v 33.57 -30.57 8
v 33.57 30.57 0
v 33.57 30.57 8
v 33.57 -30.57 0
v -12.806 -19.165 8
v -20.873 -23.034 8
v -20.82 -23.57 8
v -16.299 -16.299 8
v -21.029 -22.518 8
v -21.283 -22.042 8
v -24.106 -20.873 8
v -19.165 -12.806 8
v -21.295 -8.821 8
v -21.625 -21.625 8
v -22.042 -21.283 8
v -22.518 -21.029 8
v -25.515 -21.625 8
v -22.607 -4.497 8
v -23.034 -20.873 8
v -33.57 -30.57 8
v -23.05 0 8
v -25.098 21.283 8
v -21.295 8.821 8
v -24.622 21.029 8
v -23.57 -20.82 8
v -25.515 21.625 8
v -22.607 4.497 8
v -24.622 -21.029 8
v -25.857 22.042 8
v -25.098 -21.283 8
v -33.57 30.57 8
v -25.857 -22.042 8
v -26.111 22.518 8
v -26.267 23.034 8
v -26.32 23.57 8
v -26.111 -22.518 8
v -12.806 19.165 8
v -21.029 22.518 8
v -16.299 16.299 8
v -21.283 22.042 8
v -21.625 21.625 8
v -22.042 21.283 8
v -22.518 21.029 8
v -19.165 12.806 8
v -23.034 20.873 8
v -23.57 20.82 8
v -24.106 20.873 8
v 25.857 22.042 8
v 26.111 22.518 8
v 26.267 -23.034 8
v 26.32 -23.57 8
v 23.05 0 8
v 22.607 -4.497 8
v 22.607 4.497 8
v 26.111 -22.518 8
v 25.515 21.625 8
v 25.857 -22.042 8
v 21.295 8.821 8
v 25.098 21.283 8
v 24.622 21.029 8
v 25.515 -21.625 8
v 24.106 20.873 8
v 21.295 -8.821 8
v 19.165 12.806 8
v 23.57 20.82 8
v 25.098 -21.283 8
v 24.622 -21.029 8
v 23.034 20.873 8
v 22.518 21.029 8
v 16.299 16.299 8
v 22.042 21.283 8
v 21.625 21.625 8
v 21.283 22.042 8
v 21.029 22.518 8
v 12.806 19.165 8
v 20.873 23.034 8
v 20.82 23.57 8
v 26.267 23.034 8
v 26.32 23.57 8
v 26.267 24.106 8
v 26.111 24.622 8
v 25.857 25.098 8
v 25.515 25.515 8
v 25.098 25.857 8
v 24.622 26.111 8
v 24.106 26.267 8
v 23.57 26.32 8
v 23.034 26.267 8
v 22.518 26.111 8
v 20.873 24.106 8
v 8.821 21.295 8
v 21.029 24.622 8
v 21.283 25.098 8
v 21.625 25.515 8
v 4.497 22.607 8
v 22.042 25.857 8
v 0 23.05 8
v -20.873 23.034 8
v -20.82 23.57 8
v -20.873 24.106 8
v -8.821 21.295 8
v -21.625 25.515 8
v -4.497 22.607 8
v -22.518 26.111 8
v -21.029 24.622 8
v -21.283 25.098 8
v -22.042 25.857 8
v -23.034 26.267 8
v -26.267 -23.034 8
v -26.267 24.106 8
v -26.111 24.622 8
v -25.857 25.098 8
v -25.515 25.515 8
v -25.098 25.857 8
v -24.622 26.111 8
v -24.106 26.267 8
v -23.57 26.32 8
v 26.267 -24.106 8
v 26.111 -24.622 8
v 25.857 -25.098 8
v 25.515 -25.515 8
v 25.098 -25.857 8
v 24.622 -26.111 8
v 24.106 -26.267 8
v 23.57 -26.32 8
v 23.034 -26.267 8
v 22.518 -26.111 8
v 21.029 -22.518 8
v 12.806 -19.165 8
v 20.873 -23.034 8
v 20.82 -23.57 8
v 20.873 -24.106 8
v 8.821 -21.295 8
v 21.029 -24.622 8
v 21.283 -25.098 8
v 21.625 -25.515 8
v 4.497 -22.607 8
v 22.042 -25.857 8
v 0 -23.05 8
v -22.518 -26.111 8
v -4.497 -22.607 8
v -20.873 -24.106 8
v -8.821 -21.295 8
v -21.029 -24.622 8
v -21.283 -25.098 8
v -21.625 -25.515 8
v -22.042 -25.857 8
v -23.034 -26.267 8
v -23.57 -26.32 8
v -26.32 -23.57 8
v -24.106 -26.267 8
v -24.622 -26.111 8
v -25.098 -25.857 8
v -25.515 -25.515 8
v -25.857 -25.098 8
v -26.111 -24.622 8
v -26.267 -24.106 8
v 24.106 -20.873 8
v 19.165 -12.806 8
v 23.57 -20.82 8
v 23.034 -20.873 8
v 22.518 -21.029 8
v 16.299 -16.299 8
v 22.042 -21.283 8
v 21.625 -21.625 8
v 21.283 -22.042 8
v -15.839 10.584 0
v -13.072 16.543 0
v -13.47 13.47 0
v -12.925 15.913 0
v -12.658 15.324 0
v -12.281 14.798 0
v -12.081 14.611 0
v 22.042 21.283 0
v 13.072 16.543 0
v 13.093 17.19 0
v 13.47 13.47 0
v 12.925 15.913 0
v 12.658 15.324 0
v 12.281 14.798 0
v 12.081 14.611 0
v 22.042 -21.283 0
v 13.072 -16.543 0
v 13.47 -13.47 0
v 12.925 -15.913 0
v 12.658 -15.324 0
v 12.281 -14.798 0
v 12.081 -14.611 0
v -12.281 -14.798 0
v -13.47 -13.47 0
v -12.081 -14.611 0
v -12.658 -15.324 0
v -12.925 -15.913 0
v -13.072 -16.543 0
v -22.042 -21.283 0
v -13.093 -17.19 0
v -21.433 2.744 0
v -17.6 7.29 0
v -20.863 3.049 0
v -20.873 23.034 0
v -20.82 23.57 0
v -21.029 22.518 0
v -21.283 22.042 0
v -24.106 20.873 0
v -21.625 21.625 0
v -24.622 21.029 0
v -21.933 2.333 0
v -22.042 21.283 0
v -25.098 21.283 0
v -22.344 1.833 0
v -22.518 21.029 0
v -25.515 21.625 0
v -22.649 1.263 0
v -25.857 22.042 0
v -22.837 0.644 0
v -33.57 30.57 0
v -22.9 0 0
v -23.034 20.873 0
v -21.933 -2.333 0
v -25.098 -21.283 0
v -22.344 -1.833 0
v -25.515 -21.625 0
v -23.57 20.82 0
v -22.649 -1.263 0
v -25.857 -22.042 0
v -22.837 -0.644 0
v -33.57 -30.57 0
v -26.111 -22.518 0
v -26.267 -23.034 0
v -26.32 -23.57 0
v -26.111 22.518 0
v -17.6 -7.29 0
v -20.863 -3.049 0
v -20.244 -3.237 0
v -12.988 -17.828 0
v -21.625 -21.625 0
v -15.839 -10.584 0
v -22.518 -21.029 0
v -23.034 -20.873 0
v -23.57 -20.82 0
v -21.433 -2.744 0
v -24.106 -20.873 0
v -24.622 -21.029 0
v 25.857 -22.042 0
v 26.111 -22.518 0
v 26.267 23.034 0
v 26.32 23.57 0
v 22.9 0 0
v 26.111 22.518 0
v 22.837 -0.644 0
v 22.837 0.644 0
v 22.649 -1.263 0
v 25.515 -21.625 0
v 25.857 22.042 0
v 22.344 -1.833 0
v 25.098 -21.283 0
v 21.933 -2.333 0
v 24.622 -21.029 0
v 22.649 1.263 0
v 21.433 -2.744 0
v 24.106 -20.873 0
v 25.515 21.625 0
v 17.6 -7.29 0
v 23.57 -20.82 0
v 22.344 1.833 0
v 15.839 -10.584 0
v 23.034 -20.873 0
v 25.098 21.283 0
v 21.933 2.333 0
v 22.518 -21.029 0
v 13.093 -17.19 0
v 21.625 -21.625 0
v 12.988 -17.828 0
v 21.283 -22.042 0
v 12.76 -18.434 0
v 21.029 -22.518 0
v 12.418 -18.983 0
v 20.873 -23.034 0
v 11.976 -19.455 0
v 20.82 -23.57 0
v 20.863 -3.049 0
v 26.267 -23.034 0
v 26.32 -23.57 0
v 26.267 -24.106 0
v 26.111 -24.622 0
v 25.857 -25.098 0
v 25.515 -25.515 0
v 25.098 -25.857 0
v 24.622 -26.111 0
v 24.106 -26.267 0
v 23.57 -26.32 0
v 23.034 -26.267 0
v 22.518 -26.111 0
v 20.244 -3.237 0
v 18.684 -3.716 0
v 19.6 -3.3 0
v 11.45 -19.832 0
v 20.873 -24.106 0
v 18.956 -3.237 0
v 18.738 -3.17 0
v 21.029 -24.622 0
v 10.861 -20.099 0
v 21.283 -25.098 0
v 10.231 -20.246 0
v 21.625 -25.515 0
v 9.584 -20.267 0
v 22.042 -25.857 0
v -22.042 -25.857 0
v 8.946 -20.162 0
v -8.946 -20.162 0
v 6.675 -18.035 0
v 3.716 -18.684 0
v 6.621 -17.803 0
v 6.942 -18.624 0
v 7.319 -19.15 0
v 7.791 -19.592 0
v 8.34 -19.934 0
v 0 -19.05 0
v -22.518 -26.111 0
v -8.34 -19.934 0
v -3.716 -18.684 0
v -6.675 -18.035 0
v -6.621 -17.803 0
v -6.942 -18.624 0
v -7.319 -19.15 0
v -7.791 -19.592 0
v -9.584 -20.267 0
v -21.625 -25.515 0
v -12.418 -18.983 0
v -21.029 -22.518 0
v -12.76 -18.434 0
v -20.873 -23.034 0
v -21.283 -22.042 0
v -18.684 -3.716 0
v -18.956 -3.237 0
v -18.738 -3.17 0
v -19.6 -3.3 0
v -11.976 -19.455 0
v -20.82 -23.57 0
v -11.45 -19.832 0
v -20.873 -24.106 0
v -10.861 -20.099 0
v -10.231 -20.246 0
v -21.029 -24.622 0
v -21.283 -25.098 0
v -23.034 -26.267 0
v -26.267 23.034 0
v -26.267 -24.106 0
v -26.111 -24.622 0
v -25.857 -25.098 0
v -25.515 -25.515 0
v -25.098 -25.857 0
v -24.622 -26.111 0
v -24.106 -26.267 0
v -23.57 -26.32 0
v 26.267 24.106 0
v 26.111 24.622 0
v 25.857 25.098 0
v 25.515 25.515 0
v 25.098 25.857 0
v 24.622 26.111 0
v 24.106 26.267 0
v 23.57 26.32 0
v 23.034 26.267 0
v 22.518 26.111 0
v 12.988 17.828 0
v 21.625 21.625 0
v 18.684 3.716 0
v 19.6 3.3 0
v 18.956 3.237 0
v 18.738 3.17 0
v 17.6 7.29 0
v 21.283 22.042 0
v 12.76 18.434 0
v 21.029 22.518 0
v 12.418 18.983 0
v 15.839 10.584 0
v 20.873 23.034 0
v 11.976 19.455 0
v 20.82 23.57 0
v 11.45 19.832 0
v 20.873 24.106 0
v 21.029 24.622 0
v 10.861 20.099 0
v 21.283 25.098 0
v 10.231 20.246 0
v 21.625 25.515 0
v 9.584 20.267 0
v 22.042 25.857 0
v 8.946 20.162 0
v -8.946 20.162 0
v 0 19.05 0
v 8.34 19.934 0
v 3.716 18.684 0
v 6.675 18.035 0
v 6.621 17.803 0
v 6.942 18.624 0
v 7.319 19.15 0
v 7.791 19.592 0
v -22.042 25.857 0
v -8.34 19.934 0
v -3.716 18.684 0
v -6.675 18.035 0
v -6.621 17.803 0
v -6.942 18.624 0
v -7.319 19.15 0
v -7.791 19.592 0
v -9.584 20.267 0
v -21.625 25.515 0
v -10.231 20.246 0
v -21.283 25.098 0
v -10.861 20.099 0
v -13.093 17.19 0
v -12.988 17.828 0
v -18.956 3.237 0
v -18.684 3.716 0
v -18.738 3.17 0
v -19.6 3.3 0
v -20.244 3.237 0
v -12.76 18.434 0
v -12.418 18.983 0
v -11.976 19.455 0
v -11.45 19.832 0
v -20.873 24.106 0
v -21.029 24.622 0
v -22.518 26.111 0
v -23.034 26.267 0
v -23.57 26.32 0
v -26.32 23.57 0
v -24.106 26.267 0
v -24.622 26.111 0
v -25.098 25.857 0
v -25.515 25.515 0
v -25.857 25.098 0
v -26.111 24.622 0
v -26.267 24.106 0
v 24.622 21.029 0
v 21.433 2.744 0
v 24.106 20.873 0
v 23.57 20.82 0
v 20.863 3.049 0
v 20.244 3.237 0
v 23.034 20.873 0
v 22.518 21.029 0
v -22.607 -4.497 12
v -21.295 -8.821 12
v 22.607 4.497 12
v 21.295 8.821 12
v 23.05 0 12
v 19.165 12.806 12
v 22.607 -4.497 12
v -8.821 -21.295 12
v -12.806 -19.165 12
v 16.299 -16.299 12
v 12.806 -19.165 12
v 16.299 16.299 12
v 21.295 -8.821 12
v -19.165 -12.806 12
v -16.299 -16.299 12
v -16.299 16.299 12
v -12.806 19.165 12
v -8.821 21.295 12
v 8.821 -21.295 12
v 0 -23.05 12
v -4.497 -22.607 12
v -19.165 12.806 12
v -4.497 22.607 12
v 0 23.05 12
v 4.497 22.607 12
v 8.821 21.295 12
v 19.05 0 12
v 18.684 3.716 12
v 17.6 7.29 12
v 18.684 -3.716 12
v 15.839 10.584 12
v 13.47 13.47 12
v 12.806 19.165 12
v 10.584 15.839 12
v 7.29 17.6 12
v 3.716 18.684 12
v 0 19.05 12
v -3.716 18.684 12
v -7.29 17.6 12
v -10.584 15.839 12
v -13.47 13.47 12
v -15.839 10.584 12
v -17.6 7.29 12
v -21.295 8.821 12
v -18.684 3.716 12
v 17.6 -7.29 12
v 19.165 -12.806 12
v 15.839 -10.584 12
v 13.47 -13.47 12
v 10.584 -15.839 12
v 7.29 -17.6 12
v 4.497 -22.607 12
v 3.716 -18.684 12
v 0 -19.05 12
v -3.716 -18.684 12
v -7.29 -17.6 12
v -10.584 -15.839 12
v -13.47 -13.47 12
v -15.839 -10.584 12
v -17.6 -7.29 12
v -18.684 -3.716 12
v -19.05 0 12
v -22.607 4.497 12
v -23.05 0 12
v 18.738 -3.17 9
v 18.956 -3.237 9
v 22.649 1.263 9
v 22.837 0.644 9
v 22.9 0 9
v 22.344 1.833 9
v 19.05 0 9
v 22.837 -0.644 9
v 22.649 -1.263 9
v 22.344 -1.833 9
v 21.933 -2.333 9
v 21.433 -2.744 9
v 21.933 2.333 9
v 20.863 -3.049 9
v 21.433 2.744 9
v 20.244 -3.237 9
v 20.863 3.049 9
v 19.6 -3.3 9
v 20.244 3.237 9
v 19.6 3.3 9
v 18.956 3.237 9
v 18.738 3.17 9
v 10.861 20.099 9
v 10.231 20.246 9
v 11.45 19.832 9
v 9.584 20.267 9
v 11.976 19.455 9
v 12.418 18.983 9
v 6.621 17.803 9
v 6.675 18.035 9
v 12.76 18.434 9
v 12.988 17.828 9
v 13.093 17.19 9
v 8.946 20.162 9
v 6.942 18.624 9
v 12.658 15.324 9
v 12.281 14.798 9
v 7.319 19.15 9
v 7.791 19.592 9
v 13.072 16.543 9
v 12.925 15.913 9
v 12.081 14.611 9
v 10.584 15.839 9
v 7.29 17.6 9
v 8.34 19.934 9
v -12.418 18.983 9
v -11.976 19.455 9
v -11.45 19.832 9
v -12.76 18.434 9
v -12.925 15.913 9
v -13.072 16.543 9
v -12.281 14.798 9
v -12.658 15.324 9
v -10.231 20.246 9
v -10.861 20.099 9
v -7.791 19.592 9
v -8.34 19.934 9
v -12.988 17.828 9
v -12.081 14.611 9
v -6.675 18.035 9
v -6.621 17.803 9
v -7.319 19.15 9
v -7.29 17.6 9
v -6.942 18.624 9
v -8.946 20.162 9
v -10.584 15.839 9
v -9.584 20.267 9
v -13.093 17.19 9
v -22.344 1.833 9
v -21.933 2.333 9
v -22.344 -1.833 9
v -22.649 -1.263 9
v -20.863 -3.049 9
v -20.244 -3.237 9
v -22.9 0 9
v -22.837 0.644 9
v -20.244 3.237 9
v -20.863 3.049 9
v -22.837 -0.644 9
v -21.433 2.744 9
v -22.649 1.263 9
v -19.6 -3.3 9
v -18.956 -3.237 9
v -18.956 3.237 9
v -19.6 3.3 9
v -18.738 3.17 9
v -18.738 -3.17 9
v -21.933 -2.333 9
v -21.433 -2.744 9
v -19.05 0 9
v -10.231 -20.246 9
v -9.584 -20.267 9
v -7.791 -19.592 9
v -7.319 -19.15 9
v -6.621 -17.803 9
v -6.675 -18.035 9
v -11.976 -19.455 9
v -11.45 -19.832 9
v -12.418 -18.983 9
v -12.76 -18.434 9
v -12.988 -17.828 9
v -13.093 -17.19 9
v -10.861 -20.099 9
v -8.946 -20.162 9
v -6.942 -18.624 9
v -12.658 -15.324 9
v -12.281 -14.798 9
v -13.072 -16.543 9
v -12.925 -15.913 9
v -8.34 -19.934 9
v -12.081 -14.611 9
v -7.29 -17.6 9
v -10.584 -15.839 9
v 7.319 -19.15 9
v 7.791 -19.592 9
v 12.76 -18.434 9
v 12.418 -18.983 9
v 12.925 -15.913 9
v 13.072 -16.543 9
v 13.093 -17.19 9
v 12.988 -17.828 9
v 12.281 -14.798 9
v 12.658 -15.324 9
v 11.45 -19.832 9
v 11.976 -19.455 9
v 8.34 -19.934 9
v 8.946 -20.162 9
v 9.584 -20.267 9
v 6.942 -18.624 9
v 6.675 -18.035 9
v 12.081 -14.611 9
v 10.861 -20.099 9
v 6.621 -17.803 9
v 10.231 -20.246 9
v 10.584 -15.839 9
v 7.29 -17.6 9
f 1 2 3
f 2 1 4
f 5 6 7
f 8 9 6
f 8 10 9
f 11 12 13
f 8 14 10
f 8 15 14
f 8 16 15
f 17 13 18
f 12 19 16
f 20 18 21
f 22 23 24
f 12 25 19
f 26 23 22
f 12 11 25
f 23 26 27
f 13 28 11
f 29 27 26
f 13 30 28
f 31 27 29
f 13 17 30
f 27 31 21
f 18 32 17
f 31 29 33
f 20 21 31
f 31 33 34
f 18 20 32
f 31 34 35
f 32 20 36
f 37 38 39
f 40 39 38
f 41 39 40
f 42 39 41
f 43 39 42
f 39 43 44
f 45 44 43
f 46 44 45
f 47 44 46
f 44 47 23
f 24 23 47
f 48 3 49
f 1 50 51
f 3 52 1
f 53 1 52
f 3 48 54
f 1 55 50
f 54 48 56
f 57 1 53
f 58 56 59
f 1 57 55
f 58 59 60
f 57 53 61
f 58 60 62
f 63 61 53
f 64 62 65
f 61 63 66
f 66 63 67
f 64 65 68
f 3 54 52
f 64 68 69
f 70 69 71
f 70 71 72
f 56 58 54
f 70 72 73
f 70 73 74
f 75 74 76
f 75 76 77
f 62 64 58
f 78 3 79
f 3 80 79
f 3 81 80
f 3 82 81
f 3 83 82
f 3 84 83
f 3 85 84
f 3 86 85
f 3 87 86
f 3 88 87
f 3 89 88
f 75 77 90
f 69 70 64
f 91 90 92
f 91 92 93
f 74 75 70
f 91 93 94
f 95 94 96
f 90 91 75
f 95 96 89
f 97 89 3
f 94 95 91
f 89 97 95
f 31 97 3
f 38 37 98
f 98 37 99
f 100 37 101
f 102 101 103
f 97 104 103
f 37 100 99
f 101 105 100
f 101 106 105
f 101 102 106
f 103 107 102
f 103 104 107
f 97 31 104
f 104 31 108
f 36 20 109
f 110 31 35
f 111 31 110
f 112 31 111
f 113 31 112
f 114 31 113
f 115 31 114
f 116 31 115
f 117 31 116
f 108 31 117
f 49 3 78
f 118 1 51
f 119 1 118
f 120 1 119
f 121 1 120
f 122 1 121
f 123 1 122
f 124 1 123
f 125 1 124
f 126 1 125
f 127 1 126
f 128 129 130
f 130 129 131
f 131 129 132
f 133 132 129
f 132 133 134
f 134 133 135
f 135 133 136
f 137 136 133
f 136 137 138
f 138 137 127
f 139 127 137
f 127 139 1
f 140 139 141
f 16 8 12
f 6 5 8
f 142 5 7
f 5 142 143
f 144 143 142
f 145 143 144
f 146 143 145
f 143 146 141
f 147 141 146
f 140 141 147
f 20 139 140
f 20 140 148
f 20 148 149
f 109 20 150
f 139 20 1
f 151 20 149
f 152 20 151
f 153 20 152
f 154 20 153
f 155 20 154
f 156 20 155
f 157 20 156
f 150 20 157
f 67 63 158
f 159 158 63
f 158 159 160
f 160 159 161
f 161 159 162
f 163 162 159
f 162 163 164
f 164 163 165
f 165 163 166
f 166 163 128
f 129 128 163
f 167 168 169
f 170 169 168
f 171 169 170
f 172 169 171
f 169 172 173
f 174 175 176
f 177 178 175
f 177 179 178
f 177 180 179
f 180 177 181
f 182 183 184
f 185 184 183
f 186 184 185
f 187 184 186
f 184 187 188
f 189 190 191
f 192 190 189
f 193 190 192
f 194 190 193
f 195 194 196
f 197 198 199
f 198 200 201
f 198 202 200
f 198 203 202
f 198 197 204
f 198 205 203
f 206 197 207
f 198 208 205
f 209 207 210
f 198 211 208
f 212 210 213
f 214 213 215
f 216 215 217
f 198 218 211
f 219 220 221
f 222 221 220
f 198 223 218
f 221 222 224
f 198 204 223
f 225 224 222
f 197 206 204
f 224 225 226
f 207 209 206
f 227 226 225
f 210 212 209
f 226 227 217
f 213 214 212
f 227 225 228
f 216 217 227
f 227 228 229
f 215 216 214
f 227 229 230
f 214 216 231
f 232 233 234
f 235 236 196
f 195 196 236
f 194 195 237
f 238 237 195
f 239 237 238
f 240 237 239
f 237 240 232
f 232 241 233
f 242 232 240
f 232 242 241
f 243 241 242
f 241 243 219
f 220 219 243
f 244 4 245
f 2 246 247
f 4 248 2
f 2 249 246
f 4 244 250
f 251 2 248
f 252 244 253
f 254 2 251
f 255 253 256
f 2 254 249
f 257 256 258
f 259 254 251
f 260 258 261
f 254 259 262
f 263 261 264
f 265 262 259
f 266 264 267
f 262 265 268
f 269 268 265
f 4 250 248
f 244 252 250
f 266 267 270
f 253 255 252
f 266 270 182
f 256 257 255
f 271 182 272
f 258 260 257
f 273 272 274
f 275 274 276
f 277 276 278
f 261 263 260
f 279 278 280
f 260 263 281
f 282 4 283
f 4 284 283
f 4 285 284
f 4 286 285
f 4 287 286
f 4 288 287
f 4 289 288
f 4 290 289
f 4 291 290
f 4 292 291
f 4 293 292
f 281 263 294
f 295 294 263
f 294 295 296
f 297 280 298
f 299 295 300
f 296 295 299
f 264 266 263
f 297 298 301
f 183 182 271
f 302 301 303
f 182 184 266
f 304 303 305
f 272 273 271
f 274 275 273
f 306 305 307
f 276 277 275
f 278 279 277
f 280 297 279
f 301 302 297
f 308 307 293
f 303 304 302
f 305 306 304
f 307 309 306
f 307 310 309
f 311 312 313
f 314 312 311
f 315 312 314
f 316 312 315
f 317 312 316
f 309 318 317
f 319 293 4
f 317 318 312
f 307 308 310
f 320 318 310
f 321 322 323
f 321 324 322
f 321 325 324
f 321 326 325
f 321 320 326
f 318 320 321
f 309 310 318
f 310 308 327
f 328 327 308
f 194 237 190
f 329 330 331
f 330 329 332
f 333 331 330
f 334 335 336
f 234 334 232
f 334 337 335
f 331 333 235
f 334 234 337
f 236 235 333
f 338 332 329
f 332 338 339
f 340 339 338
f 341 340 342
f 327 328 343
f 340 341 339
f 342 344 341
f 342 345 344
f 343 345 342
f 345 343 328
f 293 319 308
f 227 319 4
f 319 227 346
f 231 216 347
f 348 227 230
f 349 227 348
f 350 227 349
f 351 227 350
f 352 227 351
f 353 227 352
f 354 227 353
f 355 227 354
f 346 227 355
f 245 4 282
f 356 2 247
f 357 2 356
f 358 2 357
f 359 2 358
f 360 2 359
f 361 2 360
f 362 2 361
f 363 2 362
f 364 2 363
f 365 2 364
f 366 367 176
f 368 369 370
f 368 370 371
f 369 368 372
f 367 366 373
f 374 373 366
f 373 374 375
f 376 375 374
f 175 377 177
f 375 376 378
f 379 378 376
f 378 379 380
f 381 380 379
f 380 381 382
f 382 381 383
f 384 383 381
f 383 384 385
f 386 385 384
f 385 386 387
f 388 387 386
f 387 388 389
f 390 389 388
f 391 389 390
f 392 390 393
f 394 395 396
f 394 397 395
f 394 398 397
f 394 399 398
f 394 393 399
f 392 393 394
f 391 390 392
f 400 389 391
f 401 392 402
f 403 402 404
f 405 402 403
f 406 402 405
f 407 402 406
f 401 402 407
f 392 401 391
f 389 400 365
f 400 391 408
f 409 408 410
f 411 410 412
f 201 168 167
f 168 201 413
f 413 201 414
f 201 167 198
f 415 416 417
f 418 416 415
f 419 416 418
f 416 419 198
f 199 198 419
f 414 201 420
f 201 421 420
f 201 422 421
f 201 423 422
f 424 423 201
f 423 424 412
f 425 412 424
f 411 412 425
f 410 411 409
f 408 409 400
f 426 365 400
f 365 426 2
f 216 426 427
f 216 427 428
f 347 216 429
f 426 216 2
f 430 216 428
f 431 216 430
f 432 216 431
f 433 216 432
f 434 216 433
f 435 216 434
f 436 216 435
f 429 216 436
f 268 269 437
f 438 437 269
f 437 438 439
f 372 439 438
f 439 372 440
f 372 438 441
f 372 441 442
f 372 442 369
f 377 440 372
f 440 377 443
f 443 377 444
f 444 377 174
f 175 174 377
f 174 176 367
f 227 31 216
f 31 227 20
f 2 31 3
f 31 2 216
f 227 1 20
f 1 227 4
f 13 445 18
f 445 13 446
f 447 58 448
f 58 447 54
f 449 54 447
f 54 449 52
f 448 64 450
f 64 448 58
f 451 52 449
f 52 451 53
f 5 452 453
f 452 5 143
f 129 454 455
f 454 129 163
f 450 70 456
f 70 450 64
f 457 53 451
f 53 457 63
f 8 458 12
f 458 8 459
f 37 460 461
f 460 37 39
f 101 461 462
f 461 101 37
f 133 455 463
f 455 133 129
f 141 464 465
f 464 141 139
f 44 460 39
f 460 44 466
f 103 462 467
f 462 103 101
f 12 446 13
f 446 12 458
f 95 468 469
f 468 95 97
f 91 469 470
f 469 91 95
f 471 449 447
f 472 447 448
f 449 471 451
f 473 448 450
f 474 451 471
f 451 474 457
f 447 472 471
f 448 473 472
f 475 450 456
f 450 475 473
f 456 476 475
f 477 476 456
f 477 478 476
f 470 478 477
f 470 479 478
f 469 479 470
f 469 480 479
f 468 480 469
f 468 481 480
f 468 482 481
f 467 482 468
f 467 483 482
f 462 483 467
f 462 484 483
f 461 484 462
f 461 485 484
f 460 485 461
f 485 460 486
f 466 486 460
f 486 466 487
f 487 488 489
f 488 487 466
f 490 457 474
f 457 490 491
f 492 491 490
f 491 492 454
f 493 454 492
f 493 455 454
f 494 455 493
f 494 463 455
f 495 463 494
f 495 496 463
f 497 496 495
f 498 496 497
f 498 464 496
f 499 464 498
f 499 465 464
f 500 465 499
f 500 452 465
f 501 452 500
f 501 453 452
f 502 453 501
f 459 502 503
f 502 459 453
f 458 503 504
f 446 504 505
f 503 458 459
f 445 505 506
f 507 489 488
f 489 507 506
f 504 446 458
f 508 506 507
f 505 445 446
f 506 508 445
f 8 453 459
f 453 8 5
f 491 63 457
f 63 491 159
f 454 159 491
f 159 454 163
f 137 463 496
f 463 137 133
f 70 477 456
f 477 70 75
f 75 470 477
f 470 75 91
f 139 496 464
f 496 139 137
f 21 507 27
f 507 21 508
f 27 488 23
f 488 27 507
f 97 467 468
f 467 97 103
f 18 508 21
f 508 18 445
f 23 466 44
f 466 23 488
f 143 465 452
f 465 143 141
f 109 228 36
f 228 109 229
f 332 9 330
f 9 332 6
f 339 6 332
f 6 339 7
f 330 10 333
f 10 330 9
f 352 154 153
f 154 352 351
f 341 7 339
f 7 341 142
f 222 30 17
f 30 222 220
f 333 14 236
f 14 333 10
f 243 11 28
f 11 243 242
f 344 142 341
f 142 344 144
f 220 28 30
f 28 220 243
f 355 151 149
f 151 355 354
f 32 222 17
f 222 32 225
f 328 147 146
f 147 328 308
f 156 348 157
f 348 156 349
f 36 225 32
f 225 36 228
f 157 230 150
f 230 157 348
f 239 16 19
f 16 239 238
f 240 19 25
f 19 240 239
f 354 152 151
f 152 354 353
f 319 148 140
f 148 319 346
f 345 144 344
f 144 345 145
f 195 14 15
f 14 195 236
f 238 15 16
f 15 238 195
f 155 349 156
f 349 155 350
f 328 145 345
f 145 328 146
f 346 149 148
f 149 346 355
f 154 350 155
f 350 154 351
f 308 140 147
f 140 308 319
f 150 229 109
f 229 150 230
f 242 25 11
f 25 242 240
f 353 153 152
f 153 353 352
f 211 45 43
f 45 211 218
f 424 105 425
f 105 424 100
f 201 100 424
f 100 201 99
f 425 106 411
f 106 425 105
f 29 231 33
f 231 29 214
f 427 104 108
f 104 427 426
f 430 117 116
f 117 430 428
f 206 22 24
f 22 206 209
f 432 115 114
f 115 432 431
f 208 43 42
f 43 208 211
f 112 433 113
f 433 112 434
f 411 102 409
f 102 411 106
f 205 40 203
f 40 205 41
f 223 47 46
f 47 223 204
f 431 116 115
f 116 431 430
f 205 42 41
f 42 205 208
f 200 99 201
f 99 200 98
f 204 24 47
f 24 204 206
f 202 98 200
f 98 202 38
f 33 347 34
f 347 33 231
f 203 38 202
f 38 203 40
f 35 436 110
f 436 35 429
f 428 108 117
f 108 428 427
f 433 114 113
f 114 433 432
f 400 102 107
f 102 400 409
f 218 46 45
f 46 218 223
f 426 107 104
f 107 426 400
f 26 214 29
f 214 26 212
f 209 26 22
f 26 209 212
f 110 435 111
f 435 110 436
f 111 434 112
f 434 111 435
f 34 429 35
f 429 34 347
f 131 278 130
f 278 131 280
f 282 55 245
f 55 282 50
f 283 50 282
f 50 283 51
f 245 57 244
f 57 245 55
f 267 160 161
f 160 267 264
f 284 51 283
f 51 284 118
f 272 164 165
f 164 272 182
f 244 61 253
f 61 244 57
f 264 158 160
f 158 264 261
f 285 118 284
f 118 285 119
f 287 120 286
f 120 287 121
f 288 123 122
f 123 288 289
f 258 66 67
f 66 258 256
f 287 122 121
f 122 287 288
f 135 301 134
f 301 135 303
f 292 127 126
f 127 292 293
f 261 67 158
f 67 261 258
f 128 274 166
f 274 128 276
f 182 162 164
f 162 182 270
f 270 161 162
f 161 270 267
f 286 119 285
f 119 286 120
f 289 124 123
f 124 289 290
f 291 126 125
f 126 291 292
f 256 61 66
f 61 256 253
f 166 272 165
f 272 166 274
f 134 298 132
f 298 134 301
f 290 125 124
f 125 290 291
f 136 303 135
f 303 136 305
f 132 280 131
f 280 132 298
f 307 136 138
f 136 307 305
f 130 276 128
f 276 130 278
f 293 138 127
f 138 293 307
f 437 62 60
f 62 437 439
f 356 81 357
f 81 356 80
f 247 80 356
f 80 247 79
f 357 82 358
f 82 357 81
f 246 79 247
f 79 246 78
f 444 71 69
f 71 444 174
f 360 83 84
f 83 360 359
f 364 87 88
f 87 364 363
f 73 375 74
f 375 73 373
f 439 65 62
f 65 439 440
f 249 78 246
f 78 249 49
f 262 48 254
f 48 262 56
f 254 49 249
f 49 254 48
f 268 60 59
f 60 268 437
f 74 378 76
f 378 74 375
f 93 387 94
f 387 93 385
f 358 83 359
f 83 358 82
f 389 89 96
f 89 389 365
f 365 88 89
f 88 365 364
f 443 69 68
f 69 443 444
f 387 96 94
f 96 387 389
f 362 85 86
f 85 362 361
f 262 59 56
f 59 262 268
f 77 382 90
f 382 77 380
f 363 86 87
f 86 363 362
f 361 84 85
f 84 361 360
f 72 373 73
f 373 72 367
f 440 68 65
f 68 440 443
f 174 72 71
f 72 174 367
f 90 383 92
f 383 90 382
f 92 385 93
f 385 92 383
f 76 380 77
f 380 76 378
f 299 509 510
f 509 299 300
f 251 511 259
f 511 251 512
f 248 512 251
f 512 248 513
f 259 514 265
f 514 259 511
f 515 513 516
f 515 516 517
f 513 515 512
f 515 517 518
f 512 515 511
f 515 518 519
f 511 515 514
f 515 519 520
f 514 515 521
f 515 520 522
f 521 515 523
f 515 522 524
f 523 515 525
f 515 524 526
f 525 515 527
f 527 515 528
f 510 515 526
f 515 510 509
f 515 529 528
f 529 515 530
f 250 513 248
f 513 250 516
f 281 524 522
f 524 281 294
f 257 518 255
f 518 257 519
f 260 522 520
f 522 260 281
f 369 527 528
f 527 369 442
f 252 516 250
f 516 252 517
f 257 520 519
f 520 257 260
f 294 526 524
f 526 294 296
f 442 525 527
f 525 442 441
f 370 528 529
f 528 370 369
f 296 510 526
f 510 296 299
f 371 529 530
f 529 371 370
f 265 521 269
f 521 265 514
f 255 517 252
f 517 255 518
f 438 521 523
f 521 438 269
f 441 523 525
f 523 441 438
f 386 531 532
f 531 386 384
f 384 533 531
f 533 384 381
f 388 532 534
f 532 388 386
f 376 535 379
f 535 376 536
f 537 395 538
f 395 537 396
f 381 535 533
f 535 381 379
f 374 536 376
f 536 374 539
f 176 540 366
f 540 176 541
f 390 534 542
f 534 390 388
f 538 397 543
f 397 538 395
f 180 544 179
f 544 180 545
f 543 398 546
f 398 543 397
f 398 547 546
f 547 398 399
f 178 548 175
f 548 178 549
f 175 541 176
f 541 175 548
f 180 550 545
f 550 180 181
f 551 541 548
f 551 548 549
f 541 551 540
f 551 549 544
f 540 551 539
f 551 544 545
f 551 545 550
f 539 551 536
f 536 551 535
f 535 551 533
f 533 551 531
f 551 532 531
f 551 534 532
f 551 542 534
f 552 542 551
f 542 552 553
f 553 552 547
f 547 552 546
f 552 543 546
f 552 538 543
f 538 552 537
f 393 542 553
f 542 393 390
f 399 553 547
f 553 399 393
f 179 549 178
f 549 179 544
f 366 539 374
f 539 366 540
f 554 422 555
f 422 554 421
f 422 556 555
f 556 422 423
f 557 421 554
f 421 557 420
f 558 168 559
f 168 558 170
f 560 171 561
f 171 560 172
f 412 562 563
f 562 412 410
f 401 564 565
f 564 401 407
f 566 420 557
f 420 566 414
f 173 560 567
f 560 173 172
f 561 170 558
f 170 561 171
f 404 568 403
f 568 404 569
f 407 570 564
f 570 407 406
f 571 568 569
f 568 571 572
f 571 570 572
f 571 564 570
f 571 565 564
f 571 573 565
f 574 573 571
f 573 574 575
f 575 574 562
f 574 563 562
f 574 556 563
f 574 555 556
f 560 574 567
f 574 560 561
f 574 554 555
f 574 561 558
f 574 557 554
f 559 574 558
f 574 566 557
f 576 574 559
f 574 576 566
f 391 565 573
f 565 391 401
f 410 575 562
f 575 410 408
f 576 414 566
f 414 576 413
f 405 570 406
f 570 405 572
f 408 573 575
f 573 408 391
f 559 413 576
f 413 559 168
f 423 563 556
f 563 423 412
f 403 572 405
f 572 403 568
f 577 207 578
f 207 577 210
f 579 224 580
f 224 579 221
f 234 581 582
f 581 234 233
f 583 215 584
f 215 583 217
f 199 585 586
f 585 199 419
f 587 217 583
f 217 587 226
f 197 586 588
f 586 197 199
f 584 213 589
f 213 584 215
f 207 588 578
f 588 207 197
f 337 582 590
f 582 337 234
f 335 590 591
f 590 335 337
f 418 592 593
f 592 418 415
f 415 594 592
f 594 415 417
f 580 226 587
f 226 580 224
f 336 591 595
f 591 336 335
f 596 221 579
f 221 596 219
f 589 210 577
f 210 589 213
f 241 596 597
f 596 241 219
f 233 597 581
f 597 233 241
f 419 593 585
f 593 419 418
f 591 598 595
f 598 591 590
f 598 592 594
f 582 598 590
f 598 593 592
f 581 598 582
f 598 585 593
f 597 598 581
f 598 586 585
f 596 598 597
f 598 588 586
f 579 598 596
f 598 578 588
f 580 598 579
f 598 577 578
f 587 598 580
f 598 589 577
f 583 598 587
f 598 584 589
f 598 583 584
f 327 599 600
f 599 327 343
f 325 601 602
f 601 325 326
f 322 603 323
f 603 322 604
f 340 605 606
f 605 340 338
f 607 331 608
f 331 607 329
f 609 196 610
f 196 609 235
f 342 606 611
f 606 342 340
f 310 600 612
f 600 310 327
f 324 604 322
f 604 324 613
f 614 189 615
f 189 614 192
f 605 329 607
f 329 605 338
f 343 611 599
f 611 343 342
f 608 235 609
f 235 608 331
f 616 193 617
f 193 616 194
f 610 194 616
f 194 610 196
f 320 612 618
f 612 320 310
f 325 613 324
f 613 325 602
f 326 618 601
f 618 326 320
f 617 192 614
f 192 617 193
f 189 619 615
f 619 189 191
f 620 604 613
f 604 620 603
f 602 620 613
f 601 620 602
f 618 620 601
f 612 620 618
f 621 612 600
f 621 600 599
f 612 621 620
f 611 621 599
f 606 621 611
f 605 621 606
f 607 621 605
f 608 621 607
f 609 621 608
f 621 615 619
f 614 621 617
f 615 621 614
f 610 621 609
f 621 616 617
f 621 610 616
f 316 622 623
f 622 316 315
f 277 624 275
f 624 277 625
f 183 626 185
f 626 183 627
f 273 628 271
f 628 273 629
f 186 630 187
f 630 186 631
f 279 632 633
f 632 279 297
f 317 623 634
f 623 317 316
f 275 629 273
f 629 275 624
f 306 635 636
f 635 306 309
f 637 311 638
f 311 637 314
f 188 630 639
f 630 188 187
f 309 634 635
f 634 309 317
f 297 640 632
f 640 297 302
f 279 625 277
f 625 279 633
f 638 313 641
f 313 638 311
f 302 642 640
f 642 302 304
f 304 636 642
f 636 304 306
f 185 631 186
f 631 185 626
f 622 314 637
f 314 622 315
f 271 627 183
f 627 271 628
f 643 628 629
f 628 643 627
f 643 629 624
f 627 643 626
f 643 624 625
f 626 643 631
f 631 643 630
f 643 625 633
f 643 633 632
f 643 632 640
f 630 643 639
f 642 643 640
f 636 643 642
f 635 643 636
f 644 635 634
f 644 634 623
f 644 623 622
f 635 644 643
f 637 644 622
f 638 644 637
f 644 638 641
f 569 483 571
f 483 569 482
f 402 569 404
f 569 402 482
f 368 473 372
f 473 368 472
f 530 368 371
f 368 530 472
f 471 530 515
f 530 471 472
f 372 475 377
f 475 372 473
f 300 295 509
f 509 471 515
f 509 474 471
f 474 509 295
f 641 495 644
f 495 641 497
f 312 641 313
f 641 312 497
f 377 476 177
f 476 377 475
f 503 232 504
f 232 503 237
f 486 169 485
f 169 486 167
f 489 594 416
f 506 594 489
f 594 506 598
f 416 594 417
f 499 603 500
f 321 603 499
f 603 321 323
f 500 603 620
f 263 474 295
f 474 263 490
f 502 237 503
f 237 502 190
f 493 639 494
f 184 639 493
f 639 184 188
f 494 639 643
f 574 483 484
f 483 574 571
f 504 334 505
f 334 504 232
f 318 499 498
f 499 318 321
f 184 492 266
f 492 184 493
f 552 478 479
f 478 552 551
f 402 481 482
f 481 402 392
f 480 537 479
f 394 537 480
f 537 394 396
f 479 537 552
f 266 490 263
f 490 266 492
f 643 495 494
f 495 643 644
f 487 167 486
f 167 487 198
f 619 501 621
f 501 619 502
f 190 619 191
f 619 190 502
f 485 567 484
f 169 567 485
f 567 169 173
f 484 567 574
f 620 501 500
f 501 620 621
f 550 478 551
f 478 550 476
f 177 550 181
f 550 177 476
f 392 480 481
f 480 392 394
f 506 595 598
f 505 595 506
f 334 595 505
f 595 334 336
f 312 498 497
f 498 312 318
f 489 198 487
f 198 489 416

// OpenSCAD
$fn = 32;

// ----------------------------------------------------------------------
// Motor mount plate: NEMA23, 67.14 x 61.14 x 12 mm
// ----------------------------------------------------------------------

// --- parameters (mm) ---
base_x = 67.14;           // plate length, X
base_y = 61.14;           // plate width, Y
thick = 8;                // plate thickness
bolt_pitch = 47.14;       // NEMA23 bolt spacing
motor_d = 5.5;            // NEMA23 screw clearance
boss_hole = 38.1;         // pilot boss bore
boss_d = 46.1;            // raised pilot ring
boss_h = 4;               // raised pilot ring height
second_d = 6.6;           // second fastener hole
bc_r = 19.6;              // second bolt circle radius
bc_n = 6;                 // second bolt circle count

module plate() {
  translate([-base_x / 2, -base_y / 2, 0]) cube([base_x, base_y, thick]);
}

module motor_holes() {
  for (sx = [-1, 1]) for (sy = [-1, 1])
    translate([sx * bolt_pitch / 2, sy * bolt_pitch / 2, -1])
      cylinder(h = thick + 2, d = motor_d);
}
module pilot_ring() {
  translate([0, 0, thick - 1]) cylinder(h = boss_h + 1, d = boss_d);
}

difference() {
  union() {
    plate();
    pilot_ring();
  }
  motor_holes();
  translate([0, 0, -1]) cylinder(h = thick + boss_h + 2, d = boss_hole);
  for (i = [0 : bc_n - 1]) rotate([0, 0, i * 360 / bc_n]) translate([bc_r, 0, -1])    cylinder(h = thick + 2, d = second_d);
}
